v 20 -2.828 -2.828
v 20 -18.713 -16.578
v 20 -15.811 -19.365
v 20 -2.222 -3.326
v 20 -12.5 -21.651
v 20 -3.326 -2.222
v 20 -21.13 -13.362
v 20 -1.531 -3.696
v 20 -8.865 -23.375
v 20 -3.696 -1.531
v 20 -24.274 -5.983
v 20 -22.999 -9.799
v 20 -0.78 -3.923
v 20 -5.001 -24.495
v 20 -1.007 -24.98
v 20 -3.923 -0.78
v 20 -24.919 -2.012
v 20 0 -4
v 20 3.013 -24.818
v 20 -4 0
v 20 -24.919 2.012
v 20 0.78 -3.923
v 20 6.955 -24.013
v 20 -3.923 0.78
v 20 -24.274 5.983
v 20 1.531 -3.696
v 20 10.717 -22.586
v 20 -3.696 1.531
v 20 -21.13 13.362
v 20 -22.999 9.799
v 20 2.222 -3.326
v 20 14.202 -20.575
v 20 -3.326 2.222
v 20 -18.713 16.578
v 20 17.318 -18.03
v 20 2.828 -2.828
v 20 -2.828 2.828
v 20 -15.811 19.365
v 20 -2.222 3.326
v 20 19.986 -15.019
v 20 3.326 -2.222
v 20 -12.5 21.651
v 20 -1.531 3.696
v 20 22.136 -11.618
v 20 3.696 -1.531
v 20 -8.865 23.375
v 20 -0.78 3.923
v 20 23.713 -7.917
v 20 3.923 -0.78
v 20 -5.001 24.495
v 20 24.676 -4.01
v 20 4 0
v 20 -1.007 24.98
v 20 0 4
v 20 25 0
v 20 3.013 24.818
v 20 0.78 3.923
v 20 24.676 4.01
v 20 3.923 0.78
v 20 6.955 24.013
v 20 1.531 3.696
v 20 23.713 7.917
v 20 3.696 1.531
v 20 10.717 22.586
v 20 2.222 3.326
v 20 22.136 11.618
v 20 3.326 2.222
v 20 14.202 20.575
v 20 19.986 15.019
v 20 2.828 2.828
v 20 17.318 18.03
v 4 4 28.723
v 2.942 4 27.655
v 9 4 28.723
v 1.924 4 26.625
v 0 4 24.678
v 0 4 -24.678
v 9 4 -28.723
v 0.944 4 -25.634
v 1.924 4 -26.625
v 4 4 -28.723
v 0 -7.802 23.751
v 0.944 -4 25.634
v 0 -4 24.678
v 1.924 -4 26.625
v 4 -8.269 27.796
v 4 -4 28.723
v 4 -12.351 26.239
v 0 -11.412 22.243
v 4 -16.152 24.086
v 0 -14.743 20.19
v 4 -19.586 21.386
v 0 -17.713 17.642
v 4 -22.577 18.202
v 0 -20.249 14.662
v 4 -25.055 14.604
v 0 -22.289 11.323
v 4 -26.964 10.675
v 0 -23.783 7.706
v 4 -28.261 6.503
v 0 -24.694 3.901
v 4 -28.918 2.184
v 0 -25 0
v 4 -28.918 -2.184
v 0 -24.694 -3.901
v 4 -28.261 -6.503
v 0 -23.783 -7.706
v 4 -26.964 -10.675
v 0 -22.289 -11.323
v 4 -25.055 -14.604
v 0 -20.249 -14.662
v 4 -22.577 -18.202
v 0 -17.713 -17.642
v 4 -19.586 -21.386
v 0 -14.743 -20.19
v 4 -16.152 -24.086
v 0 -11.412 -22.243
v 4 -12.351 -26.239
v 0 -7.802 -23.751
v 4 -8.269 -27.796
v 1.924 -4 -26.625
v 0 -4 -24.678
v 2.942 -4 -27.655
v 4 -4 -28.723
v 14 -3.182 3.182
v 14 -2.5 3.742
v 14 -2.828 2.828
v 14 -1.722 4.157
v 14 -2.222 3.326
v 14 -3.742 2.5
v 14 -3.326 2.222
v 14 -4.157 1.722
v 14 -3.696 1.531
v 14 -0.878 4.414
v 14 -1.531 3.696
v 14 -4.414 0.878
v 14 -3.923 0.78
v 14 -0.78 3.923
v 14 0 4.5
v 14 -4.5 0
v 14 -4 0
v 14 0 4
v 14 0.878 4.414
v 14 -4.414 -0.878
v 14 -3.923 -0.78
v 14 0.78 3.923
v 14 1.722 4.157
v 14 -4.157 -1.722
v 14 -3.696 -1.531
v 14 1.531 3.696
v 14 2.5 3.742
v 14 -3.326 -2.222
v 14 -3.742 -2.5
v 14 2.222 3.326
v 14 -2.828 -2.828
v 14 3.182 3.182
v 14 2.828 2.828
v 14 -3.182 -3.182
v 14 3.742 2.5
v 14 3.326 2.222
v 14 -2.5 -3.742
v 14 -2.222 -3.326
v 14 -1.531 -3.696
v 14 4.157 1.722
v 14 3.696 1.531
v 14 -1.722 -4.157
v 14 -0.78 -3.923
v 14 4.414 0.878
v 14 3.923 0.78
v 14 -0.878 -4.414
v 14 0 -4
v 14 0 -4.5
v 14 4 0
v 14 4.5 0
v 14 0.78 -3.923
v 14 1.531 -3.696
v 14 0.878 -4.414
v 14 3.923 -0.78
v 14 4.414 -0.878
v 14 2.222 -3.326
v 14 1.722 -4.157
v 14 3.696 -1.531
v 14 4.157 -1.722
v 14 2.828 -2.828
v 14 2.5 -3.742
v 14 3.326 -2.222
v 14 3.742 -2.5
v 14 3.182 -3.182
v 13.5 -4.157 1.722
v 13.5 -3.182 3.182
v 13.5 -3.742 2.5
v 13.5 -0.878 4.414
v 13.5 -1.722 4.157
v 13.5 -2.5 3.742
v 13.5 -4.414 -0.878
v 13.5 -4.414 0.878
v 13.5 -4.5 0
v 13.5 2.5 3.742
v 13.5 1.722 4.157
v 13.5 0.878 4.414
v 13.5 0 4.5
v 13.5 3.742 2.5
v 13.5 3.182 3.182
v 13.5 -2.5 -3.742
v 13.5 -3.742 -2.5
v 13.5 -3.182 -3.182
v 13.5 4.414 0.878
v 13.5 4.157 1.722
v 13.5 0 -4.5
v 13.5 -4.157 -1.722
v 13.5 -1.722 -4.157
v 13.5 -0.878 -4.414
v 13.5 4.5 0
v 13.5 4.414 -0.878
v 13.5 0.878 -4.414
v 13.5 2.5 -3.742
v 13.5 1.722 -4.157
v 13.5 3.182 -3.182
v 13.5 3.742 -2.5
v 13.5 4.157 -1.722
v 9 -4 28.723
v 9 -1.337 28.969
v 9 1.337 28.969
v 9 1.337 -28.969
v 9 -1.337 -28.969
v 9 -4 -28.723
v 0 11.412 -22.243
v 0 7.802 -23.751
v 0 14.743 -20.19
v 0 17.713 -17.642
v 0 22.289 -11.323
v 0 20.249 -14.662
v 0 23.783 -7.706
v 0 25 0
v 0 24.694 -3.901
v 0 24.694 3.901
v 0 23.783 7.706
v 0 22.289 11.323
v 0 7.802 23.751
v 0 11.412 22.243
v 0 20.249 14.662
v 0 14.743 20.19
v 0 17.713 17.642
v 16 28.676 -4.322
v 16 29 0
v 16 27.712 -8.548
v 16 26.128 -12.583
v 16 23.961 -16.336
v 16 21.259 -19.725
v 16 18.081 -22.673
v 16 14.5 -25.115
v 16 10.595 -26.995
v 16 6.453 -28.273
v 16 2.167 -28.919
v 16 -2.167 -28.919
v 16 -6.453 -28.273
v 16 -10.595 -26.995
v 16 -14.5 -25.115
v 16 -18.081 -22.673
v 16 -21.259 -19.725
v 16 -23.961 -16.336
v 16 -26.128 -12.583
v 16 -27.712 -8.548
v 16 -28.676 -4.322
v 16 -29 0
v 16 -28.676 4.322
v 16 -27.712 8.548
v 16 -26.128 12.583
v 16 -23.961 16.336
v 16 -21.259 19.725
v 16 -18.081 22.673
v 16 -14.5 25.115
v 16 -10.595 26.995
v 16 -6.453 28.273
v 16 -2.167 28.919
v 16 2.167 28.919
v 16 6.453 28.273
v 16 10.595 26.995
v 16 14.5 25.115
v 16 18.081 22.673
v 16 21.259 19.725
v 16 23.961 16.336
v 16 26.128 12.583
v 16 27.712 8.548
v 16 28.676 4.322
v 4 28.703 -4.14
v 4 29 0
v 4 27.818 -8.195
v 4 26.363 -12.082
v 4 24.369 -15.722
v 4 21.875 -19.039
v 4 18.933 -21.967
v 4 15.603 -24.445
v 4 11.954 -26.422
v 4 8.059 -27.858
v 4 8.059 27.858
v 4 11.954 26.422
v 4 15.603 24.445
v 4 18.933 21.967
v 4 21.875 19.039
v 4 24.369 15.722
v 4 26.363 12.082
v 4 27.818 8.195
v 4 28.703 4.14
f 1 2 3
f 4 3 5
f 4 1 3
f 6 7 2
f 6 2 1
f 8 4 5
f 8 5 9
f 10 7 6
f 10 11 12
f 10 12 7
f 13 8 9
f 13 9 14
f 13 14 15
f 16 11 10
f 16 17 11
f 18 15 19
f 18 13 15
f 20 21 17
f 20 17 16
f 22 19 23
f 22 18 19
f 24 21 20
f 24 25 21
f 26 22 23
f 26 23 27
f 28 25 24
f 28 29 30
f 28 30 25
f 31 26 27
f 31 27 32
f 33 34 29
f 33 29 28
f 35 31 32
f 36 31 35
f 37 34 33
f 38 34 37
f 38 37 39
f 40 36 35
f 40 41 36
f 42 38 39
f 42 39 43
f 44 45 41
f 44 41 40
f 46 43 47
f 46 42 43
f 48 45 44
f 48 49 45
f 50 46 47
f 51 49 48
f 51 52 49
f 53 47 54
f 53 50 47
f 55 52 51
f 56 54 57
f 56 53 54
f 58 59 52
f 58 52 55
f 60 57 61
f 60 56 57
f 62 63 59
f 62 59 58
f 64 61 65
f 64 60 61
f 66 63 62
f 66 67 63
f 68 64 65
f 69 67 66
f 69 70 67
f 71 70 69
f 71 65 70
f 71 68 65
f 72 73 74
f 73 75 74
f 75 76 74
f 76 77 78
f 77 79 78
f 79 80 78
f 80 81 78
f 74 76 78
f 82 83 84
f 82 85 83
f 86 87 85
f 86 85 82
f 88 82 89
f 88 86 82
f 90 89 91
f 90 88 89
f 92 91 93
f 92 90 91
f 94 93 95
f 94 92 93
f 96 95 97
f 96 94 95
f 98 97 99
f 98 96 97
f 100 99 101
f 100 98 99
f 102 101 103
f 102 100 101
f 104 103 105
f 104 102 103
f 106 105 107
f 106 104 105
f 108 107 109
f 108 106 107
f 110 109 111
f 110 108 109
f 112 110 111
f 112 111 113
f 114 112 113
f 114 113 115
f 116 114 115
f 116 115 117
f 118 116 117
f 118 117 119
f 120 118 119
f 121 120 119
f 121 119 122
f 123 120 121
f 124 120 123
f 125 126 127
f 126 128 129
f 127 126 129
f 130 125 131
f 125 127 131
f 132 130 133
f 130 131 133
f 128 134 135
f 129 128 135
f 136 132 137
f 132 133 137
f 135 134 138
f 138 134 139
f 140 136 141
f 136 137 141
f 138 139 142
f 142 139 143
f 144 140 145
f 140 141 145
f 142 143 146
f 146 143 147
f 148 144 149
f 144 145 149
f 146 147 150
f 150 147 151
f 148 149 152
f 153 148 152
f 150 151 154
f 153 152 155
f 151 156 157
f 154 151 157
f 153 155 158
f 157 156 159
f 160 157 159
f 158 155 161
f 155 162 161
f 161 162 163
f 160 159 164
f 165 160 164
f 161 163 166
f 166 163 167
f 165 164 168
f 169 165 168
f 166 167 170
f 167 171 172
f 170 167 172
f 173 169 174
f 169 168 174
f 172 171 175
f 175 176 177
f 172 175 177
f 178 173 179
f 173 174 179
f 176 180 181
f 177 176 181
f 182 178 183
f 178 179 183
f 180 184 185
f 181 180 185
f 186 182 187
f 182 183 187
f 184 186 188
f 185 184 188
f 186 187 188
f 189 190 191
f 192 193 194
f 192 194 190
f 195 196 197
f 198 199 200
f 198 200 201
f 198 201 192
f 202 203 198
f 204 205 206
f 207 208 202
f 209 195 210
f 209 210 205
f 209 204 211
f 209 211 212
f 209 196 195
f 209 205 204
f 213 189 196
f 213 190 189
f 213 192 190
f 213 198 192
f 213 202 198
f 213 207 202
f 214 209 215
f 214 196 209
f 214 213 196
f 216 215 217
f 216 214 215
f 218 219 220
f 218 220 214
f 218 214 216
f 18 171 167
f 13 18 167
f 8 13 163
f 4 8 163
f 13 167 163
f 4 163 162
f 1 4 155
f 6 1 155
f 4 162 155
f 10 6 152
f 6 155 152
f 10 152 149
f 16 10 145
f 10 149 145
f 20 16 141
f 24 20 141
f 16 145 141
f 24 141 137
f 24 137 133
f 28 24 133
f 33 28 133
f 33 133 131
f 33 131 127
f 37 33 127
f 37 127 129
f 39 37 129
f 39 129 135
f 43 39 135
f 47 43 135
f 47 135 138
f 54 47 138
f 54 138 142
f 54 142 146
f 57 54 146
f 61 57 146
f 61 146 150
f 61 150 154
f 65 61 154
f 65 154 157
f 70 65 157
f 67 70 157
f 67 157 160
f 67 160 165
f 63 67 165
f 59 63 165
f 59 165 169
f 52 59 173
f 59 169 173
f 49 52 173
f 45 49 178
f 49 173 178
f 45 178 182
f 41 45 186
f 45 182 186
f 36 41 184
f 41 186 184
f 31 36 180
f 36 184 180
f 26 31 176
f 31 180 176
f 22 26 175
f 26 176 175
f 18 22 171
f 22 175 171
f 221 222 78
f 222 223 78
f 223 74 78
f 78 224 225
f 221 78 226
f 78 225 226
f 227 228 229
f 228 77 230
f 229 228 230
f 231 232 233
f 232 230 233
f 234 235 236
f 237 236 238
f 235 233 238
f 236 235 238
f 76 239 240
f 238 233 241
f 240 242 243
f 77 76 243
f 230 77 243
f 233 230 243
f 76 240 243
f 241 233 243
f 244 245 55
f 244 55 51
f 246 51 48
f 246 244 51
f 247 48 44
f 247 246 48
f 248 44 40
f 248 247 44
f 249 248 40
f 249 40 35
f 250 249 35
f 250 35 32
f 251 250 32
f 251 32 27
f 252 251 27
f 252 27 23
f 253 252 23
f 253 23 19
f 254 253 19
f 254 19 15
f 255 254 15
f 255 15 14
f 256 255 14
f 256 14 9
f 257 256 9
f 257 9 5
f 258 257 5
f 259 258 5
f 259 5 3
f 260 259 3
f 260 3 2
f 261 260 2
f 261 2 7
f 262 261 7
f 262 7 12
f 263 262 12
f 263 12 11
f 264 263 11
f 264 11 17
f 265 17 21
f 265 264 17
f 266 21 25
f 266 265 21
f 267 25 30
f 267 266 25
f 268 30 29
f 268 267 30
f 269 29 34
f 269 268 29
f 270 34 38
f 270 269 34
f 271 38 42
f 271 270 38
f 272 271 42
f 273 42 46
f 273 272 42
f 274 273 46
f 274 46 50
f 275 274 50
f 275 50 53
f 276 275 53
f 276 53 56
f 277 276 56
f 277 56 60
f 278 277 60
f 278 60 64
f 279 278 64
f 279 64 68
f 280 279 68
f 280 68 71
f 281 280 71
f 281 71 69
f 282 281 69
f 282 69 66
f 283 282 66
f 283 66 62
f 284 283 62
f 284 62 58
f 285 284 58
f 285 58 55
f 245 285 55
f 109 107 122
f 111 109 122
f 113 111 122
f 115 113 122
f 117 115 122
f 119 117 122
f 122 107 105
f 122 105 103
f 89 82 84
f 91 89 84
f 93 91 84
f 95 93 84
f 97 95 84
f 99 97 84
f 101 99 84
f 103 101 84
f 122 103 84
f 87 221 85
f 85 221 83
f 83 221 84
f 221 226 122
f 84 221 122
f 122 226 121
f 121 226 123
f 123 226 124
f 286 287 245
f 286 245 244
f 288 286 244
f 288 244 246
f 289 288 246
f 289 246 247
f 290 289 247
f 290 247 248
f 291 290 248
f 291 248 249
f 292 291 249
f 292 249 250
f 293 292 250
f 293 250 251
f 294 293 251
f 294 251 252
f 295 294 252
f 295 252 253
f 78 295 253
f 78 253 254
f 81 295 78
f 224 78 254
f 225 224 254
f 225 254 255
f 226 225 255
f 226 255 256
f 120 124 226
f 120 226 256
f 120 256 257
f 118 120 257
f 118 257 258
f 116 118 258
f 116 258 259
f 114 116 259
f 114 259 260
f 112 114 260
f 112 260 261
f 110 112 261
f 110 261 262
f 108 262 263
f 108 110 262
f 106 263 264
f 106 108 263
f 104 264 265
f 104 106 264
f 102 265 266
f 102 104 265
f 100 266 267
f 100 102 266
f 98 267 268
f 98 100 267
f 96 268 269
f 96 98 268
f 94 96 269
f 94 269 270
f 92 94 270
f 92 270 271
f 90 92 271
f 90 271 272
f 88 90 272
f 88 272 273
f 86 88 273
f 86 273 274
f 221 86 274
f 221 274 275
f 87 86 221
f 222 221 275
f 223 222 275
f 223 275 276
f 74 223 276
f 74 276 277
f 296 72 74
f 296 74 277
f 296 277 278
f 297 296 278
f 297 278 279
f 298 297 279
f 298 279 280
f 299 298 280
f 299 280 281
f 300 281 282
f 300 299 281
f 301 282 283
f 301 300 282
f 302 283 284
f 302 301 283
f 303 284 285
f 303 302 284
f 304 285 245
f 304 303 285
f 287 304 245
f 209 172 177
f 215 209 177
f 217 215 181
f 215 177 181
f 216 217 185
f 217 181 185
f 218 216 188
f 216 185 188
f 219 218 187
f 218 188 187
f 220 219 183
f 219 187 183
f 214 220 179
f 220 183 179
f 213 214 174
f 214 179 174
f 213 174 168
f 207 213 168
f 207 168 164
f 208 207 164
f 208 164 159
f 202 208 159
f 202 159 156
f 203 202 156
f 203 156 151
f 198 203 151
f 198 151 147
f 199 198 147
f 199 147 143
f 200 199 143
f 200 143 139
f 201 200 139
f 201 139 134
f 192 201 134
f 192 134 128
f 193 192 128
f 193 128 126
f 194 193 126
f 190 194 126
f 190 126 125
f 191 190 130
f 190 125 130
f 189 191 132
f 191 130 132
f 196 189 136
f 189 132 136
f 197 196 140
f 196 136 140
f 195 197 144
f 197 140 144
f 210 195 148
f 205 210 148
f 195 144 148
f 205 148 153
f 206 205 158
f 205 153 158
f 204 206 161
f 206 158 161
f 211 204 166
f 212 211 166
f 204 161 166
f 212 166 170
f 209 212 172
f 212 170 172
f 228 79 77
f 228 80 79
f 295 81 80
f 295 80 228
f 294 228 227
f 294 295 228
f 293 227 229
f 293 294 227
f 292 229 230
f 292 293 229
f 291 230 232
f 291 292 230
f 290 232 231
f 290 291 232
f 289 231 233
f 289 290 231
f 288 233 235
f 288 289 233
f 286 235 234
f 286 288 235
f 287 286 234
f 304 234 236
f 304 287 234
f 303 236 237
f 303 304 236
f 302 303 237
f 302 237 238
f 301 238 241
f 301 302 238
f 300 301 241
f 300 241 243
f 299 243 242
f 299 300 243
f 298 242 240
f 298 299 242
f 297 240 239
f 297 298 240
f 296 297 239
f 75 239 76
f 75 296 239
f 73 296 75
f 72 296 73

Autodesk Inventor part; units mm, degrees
ref_plane "YZ Plane" through (0, 0, 0) normal (1, 0, 0) x (0, 1, 0)
ref_plane "XZ Plane" through (0, 0, 0) normal (0, 1, 0) x (-1, 0, 0)
ref_plane "XY Plane" through (0, 0, 0) normal (0, 0, 1) x (1, 0, 0)
sketch "Эскиз4" plane through (0, 0, 0) normal (0, 0, 1) x (1, 0, 0)
  line L0 (0, 0) -> (20, 0)
  line L1 (20, 0) -> (20, 25)
  line L2 (16, 29) -> (4, 29)
  line L3 (0, 25) -> (0, 0)
  line L4 (4, 29) -> (0, 25)
  line L5 (16, 29) -> (20, 25)
  point P0 (20, 29)
  point P1 (0, 29)
  dimension "d20" = 20
  dimension "d21" = 29
  dimension "d22" = 4
  dimension "d23" = 4
  dimension "d24" = 4
  dimension "d25" = 4
revolve "Вращение3" add sketch "Эскиз4" angle 360 about axis through (0, 0, 0) along (1, 0, 0)
sketch "Эскиз5" plane through (0, 0, 0) normal (0, 0, 1) x (1, 0, 0)
  line L0 (0, 4) -> (9, 4)
  line L1 (9, 4) -> (9, -4)
  line L2 (9, -4) -> (0, -4)
  line L3 (0, -4) -> (0, 4)
  point P0 (0, 0)
  point P1 (0, 0)
  dimension "d27" = 9
  dimension "d28" = 8
extrude "Выдавливание2" cut sketch "Эскиз5" along normal through all both and the other way through all
sketch "Эскиз6" plane through (20, 0, 0) normal (1, 0, 0) x (0, 0, -1)
  point P0 (0, 0)
  point P1 (0, 0)
hole "Отверстие1" at (20, 0, 0) direction (-1, 0, 0) diameter 8 depth 6
sketch "Эскиз7" plane through (14, 0, 0) normal (1, 0, 0) x (0, 0, -1)
  circle A0 centre (0, 0) radius 4.5
  dimension "d38" = 9
extrude "Выдавливание3" cut sketch "Эскиз7" against normal blind 0.5
thread "Резьба3" size "M8x1.25" class "6H" standard "ANSI Metric M Profile" full length
equation "\"d23\" = d22"
equation "\"d24\" = d22"
equation "\"d25\" = d24"
properties part number "711133"
